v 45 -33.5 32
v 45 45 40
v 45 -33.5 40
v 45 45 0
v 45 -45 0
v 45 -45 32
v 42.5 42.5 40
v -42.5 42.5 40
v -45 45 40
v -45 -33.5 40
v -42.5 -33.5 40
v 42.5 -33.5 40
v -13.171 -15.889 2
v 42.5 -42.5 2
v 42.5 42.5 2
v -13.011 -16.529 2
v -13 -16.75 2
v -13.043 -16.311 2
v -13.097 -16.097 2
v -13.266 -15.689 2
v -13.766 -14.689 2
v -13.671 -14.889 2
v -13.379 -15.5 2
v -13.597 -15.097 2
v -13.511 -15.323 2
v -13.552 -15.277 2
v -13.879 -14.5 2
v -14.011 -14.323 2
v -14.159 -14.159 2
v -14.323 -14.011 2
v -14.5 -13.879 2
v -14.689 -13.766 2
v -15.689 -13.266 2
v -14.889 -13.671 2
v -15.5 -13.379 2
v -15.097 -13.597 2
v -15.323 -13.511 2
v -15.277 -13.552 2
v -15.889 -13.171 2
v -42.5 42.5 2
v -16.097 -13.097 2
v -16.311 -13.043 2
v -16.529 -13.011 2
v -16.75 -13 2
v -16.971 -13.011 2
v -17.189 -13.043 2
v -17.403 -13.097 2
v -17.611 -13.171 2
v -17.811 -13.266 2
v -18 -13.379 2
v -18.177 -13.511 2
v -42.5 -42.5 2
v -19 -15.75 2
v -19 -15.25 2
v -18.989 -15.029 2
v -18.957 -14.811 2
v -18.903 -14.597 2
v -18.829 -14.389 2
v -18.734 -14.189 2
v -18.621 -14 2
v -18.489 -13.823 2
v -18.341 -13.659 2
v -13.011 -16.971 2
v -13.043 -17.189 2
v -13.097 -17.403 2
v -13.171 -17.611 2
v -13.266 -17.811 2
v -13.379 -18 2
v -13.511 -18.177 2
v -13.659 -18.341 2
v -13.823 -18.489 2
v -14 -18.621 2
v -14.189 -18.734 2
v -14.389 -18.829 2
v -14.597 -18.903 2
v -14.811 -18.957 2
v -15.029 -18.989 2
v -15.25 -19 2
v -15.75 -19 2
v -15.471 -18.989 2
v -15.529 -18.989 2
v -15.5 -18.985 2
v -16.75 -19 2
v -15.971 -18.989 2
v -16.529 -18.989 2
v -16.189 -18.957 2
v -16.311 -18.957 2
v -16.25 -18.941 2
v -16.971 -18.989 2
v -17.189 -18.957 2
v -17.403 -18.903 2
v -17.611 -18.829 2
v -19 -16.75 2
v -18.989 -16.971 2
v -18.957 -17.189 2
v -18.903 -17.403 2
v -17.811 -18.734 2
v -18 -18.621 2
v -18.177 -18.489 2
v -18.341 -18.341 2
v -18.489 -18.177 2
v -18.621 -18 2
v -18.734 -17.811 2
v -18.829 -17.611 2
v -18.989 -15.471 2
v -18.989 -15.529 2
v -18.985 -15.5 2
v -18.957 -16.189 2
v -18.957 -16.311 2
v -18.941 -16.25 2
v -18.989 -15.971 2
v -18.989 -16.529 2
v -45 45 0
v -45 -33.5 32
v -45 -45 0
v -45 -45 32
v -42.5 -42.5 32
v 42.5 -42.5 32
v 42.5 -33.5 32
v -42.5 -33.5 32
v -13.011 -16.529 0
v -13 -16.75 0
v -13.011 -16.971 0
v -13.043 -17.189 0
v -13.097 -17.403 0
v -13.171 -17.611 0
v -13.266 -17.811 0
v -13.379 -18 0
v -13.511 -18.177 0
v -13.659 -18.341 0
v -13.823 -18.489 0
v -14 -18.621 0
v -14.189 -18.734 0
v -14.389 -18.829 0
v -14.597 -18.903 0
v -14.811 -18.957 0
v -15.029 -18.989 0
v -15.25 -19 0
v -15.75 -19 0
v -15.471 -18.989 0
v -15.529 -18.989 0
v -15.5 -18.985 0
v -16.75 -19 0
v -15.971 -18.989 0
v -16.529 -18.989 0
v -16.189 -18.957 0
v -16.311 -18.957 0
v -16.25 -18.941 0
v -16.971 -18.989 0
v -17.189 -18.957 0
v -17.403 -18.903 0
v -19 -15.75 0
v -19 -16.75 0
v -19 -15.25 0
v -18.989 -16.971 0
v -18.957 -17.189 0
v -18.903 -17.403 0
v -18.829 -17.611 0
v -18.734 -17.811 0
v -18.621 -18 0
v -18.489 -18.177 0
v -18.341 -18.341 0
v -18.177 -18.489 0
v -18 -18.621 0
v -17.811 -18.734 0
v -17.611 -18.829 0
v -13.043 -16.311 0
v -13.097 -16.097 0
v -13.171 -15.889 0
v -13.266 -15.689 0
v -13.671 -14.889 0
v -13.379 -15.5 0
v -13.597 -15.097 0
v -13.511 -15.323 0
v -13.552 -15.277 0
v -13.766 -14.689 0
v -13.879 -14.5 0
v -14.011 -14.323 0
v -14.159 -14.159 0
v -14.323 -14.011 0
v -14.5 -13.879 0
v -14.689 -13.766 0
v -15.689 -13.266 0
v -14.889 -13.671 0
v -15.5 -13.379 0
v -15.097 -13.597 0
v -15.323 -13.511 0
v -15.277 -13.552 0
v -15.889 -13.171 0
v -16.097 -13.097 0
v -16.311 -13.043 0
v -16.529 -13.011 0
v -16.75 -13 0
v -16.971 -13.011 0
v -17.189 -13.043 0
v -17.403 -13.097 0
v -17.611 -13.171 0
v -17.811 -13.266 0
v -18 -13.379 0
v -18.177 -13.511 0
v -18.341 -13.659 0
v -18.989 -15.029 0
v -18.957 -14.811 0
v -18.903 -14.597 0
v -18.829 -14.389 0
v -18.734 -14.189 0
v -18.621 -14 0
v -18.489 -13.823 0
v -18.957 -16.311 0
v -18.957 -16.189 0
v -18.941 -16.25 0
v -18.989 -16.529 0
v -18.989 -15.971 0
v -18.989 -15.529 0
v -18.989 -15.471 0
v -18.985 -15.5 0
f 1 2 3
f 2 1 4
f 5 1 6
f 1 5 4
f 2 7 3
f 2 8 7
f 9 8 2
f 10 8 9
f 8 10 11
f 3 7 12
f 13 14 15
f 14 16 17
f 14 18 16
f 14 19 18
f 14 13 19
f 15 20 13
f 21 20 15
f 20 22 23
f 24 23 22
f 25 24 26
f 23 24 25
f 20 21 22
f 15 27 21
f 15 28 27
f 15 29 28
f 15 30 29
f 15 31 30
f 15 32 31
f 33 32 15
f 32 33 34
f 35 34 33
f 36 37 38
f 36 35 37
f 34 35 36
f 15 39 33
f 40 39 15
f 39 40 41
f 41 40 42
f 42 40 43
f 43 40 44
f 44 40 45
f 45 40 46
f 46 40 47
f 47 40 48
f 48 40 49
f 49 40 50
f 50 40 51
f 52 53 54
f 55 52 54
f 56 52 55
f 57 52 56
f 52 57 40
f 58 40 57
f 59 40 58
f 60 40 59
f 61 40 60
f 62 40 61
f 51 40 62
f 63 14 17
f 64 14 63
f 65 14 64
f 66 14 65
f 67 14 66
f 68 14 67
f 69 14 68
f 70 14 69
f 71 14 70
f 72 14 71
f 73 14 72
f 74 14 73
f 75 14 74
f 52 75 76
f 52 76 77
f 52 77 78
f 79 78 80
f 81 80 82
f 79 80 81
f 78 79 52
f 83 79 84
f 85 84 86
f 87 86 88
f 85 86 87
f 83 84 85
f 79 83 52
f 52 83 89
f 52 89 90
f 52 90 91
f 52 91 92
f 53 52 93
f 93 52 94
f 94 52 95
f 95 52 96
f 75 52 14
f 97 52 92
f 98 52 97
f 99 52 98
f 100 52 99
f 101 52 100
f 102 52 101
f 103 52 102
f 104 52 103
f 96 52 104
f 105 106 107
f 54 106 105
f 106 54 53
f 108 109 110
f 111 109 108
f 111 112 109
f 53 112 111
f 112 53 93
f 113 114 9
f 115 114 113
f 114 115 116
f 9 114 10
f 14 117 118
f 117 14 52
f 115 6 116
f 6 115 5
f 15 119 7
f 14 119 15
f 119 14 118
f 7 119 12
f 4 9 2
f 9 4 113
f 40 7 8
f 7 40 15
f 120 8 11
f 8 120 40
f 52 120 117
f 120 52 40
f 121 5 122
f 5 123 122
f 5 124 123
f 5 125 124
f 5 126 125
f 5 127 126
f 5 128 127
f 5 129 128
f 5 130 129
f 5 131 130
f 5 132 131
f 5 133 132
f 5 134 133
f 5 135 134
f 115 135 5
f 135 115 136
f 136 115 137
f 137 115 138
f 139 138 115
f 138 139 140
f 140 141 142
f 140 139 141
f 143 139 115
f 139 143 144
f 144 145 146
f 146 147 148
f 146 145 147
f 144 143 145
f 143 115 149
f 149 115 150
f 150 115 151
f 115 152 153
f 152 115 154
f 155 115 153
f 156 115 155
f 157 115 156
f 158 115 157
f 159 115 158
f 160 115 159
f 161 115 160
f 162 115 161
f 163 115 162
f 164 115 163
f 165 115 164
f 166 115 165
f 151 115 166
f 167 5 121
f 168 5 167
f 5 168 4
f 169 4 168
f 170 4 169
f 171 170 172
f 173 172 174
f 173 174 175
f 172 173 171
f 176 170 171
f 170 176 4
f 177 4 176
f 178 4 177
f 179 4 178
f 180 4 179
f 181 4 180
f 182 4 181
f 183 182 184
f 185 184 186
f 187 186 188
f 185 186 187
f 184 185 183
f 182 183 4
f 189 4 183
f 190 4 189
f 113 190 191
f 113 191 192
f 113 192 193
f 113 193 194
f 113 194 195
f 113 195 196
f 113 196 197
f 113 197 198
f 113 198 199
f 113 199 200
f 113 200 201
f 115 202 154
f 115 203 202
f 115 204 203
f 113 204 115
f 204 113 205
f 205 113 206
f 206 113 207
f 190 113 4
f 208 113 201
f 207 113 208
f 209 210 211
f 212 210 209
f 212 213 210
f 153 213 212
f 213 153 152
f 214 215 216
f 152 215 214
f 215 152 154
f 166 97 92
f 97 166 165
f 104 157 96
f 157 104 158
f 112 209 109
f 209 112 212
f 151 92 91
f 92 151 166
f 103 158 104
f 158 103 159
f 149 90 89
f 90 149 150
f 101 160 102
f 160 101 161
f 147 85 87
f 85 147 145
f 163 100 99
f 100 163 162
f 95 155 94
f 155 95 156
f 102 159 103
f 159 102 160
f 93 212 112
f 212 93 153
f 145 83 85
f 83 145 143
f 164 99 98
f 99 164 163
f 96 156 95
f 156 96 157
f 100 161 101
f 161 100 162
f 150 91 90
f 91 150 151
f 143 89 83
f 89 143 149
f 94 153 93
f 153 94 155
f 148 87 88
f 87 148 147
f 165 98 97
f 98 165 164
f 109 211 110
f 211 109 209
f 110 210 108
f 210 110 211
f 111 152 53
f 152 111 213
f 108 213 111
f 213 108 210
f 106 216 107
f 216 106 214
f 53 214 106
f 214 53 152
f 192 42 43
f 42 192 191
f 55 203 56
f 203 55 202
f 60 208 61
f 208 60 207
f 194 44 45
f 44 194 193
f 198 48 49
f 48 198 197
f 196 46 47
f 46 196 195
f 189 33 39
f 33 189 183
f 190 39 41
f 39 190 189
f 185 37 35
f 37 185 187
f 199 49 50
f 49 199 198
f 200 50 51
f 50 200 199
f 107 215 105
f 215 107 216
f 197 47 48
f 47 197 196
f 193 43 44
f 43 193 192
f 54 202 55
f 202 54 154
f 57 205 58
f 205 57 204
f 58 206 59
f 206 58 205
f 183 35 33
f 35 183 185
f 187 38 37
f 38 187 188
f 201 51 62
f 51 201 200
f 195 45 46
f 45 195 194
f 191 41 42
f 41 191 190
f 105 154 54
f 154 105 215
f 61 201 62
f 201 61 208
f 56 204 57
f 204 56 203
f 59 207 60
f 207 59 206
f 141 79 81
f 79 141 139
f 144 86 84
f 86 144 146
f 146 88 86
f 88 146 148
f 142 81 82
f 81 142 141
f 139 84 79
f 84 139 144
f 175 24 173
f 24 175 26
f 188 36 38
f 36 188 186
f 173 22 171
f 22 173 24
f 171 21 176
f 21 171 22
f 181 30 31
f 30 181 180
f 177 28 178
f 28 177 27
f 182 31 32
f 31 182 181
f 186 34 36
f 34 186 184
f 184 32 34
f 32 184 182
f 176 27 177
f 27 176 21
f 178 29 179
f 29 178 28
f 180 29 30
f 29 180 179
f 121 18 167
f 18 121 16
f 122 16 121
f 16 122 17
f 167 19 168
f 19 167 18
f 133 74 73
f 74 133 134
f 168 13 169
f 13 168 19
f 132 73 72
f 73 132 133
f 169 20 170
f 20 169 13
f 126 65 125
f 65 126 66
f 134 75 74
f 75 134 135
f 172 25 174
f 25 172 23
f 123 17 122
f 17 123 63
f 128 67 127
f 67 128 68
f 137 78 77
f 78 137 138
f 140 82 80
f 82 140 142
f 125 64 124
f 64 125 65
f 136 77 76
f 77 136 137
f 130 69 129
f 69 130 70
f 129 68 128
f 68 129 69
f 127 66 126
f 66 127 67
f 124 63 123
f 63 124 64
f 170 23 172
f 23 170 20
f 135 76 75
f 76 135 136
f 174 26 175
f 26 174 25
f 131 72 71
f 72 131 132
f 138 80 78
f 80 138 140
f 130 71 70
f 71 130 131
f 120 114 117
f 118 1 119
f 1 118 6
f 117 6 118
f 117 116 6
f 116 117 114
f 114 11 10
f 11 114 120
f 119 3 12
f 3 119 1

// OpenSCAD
// Magnetic stirrer housing - upside-down open box over PC fan
// Print orientation: top plate flat on bed, walls rising in +Z

$fn = 64;

// ---- Dimensions (mm) ----
plate_t      = 2;     // top plate thickness
wall_t       = 2.5;   // wall thickness
box_h        = 40;    // total height (plate + walls)
outer_x      = 90;    // outer size in X
outer_y      = 90;    // outer size in Y
hole_d       = 4.5;   // M4 screw hole diameter
hole_p       = 71.5;  // square pitch of screw holes
notch_w      = 12;    // cable notch width
notch_bottom = 32;    // notch floor height (z)
eps          = 0.5;   // cutter overshoot

// ---- Model ----
difference() {
    // Box body
    union() {
        // Top plate
        translate([-outer_x/2, -outer_y/2, 0])
            cube([outer_x, outer_y, plate_t]);
        // Walls
        for (a = [0, 90, 180, 270])
            rotate([0, 0, a])
                translate([-outer_x/2, -outer_y/2, plate_t])
                    cube([outer_x, wall_t, box_h - plate_t]);
    }

    // Screw holes through top plate
    for (i = [0 : 3])
        for (j = [0 : 3])
            if (i + j == 3 || (i % 2 == 0 && j % 2 == 0))
                translate([(i - (hole_p - hole_d)/2) / 2,
                           (j - (hole_p - hole_d)/2) / 2,
                           -eps])
                    cylinder(d = hole_d, h = plate_t + 2*eps);

    // Cable notch in one wall, open at the top edge
    translate([-outer_x/2 - eps, -outer_y/2 - eps, notch_bottom])
        cube([outer_x + 2*eps, notch_w, box_h - notch_bottom]);
}
